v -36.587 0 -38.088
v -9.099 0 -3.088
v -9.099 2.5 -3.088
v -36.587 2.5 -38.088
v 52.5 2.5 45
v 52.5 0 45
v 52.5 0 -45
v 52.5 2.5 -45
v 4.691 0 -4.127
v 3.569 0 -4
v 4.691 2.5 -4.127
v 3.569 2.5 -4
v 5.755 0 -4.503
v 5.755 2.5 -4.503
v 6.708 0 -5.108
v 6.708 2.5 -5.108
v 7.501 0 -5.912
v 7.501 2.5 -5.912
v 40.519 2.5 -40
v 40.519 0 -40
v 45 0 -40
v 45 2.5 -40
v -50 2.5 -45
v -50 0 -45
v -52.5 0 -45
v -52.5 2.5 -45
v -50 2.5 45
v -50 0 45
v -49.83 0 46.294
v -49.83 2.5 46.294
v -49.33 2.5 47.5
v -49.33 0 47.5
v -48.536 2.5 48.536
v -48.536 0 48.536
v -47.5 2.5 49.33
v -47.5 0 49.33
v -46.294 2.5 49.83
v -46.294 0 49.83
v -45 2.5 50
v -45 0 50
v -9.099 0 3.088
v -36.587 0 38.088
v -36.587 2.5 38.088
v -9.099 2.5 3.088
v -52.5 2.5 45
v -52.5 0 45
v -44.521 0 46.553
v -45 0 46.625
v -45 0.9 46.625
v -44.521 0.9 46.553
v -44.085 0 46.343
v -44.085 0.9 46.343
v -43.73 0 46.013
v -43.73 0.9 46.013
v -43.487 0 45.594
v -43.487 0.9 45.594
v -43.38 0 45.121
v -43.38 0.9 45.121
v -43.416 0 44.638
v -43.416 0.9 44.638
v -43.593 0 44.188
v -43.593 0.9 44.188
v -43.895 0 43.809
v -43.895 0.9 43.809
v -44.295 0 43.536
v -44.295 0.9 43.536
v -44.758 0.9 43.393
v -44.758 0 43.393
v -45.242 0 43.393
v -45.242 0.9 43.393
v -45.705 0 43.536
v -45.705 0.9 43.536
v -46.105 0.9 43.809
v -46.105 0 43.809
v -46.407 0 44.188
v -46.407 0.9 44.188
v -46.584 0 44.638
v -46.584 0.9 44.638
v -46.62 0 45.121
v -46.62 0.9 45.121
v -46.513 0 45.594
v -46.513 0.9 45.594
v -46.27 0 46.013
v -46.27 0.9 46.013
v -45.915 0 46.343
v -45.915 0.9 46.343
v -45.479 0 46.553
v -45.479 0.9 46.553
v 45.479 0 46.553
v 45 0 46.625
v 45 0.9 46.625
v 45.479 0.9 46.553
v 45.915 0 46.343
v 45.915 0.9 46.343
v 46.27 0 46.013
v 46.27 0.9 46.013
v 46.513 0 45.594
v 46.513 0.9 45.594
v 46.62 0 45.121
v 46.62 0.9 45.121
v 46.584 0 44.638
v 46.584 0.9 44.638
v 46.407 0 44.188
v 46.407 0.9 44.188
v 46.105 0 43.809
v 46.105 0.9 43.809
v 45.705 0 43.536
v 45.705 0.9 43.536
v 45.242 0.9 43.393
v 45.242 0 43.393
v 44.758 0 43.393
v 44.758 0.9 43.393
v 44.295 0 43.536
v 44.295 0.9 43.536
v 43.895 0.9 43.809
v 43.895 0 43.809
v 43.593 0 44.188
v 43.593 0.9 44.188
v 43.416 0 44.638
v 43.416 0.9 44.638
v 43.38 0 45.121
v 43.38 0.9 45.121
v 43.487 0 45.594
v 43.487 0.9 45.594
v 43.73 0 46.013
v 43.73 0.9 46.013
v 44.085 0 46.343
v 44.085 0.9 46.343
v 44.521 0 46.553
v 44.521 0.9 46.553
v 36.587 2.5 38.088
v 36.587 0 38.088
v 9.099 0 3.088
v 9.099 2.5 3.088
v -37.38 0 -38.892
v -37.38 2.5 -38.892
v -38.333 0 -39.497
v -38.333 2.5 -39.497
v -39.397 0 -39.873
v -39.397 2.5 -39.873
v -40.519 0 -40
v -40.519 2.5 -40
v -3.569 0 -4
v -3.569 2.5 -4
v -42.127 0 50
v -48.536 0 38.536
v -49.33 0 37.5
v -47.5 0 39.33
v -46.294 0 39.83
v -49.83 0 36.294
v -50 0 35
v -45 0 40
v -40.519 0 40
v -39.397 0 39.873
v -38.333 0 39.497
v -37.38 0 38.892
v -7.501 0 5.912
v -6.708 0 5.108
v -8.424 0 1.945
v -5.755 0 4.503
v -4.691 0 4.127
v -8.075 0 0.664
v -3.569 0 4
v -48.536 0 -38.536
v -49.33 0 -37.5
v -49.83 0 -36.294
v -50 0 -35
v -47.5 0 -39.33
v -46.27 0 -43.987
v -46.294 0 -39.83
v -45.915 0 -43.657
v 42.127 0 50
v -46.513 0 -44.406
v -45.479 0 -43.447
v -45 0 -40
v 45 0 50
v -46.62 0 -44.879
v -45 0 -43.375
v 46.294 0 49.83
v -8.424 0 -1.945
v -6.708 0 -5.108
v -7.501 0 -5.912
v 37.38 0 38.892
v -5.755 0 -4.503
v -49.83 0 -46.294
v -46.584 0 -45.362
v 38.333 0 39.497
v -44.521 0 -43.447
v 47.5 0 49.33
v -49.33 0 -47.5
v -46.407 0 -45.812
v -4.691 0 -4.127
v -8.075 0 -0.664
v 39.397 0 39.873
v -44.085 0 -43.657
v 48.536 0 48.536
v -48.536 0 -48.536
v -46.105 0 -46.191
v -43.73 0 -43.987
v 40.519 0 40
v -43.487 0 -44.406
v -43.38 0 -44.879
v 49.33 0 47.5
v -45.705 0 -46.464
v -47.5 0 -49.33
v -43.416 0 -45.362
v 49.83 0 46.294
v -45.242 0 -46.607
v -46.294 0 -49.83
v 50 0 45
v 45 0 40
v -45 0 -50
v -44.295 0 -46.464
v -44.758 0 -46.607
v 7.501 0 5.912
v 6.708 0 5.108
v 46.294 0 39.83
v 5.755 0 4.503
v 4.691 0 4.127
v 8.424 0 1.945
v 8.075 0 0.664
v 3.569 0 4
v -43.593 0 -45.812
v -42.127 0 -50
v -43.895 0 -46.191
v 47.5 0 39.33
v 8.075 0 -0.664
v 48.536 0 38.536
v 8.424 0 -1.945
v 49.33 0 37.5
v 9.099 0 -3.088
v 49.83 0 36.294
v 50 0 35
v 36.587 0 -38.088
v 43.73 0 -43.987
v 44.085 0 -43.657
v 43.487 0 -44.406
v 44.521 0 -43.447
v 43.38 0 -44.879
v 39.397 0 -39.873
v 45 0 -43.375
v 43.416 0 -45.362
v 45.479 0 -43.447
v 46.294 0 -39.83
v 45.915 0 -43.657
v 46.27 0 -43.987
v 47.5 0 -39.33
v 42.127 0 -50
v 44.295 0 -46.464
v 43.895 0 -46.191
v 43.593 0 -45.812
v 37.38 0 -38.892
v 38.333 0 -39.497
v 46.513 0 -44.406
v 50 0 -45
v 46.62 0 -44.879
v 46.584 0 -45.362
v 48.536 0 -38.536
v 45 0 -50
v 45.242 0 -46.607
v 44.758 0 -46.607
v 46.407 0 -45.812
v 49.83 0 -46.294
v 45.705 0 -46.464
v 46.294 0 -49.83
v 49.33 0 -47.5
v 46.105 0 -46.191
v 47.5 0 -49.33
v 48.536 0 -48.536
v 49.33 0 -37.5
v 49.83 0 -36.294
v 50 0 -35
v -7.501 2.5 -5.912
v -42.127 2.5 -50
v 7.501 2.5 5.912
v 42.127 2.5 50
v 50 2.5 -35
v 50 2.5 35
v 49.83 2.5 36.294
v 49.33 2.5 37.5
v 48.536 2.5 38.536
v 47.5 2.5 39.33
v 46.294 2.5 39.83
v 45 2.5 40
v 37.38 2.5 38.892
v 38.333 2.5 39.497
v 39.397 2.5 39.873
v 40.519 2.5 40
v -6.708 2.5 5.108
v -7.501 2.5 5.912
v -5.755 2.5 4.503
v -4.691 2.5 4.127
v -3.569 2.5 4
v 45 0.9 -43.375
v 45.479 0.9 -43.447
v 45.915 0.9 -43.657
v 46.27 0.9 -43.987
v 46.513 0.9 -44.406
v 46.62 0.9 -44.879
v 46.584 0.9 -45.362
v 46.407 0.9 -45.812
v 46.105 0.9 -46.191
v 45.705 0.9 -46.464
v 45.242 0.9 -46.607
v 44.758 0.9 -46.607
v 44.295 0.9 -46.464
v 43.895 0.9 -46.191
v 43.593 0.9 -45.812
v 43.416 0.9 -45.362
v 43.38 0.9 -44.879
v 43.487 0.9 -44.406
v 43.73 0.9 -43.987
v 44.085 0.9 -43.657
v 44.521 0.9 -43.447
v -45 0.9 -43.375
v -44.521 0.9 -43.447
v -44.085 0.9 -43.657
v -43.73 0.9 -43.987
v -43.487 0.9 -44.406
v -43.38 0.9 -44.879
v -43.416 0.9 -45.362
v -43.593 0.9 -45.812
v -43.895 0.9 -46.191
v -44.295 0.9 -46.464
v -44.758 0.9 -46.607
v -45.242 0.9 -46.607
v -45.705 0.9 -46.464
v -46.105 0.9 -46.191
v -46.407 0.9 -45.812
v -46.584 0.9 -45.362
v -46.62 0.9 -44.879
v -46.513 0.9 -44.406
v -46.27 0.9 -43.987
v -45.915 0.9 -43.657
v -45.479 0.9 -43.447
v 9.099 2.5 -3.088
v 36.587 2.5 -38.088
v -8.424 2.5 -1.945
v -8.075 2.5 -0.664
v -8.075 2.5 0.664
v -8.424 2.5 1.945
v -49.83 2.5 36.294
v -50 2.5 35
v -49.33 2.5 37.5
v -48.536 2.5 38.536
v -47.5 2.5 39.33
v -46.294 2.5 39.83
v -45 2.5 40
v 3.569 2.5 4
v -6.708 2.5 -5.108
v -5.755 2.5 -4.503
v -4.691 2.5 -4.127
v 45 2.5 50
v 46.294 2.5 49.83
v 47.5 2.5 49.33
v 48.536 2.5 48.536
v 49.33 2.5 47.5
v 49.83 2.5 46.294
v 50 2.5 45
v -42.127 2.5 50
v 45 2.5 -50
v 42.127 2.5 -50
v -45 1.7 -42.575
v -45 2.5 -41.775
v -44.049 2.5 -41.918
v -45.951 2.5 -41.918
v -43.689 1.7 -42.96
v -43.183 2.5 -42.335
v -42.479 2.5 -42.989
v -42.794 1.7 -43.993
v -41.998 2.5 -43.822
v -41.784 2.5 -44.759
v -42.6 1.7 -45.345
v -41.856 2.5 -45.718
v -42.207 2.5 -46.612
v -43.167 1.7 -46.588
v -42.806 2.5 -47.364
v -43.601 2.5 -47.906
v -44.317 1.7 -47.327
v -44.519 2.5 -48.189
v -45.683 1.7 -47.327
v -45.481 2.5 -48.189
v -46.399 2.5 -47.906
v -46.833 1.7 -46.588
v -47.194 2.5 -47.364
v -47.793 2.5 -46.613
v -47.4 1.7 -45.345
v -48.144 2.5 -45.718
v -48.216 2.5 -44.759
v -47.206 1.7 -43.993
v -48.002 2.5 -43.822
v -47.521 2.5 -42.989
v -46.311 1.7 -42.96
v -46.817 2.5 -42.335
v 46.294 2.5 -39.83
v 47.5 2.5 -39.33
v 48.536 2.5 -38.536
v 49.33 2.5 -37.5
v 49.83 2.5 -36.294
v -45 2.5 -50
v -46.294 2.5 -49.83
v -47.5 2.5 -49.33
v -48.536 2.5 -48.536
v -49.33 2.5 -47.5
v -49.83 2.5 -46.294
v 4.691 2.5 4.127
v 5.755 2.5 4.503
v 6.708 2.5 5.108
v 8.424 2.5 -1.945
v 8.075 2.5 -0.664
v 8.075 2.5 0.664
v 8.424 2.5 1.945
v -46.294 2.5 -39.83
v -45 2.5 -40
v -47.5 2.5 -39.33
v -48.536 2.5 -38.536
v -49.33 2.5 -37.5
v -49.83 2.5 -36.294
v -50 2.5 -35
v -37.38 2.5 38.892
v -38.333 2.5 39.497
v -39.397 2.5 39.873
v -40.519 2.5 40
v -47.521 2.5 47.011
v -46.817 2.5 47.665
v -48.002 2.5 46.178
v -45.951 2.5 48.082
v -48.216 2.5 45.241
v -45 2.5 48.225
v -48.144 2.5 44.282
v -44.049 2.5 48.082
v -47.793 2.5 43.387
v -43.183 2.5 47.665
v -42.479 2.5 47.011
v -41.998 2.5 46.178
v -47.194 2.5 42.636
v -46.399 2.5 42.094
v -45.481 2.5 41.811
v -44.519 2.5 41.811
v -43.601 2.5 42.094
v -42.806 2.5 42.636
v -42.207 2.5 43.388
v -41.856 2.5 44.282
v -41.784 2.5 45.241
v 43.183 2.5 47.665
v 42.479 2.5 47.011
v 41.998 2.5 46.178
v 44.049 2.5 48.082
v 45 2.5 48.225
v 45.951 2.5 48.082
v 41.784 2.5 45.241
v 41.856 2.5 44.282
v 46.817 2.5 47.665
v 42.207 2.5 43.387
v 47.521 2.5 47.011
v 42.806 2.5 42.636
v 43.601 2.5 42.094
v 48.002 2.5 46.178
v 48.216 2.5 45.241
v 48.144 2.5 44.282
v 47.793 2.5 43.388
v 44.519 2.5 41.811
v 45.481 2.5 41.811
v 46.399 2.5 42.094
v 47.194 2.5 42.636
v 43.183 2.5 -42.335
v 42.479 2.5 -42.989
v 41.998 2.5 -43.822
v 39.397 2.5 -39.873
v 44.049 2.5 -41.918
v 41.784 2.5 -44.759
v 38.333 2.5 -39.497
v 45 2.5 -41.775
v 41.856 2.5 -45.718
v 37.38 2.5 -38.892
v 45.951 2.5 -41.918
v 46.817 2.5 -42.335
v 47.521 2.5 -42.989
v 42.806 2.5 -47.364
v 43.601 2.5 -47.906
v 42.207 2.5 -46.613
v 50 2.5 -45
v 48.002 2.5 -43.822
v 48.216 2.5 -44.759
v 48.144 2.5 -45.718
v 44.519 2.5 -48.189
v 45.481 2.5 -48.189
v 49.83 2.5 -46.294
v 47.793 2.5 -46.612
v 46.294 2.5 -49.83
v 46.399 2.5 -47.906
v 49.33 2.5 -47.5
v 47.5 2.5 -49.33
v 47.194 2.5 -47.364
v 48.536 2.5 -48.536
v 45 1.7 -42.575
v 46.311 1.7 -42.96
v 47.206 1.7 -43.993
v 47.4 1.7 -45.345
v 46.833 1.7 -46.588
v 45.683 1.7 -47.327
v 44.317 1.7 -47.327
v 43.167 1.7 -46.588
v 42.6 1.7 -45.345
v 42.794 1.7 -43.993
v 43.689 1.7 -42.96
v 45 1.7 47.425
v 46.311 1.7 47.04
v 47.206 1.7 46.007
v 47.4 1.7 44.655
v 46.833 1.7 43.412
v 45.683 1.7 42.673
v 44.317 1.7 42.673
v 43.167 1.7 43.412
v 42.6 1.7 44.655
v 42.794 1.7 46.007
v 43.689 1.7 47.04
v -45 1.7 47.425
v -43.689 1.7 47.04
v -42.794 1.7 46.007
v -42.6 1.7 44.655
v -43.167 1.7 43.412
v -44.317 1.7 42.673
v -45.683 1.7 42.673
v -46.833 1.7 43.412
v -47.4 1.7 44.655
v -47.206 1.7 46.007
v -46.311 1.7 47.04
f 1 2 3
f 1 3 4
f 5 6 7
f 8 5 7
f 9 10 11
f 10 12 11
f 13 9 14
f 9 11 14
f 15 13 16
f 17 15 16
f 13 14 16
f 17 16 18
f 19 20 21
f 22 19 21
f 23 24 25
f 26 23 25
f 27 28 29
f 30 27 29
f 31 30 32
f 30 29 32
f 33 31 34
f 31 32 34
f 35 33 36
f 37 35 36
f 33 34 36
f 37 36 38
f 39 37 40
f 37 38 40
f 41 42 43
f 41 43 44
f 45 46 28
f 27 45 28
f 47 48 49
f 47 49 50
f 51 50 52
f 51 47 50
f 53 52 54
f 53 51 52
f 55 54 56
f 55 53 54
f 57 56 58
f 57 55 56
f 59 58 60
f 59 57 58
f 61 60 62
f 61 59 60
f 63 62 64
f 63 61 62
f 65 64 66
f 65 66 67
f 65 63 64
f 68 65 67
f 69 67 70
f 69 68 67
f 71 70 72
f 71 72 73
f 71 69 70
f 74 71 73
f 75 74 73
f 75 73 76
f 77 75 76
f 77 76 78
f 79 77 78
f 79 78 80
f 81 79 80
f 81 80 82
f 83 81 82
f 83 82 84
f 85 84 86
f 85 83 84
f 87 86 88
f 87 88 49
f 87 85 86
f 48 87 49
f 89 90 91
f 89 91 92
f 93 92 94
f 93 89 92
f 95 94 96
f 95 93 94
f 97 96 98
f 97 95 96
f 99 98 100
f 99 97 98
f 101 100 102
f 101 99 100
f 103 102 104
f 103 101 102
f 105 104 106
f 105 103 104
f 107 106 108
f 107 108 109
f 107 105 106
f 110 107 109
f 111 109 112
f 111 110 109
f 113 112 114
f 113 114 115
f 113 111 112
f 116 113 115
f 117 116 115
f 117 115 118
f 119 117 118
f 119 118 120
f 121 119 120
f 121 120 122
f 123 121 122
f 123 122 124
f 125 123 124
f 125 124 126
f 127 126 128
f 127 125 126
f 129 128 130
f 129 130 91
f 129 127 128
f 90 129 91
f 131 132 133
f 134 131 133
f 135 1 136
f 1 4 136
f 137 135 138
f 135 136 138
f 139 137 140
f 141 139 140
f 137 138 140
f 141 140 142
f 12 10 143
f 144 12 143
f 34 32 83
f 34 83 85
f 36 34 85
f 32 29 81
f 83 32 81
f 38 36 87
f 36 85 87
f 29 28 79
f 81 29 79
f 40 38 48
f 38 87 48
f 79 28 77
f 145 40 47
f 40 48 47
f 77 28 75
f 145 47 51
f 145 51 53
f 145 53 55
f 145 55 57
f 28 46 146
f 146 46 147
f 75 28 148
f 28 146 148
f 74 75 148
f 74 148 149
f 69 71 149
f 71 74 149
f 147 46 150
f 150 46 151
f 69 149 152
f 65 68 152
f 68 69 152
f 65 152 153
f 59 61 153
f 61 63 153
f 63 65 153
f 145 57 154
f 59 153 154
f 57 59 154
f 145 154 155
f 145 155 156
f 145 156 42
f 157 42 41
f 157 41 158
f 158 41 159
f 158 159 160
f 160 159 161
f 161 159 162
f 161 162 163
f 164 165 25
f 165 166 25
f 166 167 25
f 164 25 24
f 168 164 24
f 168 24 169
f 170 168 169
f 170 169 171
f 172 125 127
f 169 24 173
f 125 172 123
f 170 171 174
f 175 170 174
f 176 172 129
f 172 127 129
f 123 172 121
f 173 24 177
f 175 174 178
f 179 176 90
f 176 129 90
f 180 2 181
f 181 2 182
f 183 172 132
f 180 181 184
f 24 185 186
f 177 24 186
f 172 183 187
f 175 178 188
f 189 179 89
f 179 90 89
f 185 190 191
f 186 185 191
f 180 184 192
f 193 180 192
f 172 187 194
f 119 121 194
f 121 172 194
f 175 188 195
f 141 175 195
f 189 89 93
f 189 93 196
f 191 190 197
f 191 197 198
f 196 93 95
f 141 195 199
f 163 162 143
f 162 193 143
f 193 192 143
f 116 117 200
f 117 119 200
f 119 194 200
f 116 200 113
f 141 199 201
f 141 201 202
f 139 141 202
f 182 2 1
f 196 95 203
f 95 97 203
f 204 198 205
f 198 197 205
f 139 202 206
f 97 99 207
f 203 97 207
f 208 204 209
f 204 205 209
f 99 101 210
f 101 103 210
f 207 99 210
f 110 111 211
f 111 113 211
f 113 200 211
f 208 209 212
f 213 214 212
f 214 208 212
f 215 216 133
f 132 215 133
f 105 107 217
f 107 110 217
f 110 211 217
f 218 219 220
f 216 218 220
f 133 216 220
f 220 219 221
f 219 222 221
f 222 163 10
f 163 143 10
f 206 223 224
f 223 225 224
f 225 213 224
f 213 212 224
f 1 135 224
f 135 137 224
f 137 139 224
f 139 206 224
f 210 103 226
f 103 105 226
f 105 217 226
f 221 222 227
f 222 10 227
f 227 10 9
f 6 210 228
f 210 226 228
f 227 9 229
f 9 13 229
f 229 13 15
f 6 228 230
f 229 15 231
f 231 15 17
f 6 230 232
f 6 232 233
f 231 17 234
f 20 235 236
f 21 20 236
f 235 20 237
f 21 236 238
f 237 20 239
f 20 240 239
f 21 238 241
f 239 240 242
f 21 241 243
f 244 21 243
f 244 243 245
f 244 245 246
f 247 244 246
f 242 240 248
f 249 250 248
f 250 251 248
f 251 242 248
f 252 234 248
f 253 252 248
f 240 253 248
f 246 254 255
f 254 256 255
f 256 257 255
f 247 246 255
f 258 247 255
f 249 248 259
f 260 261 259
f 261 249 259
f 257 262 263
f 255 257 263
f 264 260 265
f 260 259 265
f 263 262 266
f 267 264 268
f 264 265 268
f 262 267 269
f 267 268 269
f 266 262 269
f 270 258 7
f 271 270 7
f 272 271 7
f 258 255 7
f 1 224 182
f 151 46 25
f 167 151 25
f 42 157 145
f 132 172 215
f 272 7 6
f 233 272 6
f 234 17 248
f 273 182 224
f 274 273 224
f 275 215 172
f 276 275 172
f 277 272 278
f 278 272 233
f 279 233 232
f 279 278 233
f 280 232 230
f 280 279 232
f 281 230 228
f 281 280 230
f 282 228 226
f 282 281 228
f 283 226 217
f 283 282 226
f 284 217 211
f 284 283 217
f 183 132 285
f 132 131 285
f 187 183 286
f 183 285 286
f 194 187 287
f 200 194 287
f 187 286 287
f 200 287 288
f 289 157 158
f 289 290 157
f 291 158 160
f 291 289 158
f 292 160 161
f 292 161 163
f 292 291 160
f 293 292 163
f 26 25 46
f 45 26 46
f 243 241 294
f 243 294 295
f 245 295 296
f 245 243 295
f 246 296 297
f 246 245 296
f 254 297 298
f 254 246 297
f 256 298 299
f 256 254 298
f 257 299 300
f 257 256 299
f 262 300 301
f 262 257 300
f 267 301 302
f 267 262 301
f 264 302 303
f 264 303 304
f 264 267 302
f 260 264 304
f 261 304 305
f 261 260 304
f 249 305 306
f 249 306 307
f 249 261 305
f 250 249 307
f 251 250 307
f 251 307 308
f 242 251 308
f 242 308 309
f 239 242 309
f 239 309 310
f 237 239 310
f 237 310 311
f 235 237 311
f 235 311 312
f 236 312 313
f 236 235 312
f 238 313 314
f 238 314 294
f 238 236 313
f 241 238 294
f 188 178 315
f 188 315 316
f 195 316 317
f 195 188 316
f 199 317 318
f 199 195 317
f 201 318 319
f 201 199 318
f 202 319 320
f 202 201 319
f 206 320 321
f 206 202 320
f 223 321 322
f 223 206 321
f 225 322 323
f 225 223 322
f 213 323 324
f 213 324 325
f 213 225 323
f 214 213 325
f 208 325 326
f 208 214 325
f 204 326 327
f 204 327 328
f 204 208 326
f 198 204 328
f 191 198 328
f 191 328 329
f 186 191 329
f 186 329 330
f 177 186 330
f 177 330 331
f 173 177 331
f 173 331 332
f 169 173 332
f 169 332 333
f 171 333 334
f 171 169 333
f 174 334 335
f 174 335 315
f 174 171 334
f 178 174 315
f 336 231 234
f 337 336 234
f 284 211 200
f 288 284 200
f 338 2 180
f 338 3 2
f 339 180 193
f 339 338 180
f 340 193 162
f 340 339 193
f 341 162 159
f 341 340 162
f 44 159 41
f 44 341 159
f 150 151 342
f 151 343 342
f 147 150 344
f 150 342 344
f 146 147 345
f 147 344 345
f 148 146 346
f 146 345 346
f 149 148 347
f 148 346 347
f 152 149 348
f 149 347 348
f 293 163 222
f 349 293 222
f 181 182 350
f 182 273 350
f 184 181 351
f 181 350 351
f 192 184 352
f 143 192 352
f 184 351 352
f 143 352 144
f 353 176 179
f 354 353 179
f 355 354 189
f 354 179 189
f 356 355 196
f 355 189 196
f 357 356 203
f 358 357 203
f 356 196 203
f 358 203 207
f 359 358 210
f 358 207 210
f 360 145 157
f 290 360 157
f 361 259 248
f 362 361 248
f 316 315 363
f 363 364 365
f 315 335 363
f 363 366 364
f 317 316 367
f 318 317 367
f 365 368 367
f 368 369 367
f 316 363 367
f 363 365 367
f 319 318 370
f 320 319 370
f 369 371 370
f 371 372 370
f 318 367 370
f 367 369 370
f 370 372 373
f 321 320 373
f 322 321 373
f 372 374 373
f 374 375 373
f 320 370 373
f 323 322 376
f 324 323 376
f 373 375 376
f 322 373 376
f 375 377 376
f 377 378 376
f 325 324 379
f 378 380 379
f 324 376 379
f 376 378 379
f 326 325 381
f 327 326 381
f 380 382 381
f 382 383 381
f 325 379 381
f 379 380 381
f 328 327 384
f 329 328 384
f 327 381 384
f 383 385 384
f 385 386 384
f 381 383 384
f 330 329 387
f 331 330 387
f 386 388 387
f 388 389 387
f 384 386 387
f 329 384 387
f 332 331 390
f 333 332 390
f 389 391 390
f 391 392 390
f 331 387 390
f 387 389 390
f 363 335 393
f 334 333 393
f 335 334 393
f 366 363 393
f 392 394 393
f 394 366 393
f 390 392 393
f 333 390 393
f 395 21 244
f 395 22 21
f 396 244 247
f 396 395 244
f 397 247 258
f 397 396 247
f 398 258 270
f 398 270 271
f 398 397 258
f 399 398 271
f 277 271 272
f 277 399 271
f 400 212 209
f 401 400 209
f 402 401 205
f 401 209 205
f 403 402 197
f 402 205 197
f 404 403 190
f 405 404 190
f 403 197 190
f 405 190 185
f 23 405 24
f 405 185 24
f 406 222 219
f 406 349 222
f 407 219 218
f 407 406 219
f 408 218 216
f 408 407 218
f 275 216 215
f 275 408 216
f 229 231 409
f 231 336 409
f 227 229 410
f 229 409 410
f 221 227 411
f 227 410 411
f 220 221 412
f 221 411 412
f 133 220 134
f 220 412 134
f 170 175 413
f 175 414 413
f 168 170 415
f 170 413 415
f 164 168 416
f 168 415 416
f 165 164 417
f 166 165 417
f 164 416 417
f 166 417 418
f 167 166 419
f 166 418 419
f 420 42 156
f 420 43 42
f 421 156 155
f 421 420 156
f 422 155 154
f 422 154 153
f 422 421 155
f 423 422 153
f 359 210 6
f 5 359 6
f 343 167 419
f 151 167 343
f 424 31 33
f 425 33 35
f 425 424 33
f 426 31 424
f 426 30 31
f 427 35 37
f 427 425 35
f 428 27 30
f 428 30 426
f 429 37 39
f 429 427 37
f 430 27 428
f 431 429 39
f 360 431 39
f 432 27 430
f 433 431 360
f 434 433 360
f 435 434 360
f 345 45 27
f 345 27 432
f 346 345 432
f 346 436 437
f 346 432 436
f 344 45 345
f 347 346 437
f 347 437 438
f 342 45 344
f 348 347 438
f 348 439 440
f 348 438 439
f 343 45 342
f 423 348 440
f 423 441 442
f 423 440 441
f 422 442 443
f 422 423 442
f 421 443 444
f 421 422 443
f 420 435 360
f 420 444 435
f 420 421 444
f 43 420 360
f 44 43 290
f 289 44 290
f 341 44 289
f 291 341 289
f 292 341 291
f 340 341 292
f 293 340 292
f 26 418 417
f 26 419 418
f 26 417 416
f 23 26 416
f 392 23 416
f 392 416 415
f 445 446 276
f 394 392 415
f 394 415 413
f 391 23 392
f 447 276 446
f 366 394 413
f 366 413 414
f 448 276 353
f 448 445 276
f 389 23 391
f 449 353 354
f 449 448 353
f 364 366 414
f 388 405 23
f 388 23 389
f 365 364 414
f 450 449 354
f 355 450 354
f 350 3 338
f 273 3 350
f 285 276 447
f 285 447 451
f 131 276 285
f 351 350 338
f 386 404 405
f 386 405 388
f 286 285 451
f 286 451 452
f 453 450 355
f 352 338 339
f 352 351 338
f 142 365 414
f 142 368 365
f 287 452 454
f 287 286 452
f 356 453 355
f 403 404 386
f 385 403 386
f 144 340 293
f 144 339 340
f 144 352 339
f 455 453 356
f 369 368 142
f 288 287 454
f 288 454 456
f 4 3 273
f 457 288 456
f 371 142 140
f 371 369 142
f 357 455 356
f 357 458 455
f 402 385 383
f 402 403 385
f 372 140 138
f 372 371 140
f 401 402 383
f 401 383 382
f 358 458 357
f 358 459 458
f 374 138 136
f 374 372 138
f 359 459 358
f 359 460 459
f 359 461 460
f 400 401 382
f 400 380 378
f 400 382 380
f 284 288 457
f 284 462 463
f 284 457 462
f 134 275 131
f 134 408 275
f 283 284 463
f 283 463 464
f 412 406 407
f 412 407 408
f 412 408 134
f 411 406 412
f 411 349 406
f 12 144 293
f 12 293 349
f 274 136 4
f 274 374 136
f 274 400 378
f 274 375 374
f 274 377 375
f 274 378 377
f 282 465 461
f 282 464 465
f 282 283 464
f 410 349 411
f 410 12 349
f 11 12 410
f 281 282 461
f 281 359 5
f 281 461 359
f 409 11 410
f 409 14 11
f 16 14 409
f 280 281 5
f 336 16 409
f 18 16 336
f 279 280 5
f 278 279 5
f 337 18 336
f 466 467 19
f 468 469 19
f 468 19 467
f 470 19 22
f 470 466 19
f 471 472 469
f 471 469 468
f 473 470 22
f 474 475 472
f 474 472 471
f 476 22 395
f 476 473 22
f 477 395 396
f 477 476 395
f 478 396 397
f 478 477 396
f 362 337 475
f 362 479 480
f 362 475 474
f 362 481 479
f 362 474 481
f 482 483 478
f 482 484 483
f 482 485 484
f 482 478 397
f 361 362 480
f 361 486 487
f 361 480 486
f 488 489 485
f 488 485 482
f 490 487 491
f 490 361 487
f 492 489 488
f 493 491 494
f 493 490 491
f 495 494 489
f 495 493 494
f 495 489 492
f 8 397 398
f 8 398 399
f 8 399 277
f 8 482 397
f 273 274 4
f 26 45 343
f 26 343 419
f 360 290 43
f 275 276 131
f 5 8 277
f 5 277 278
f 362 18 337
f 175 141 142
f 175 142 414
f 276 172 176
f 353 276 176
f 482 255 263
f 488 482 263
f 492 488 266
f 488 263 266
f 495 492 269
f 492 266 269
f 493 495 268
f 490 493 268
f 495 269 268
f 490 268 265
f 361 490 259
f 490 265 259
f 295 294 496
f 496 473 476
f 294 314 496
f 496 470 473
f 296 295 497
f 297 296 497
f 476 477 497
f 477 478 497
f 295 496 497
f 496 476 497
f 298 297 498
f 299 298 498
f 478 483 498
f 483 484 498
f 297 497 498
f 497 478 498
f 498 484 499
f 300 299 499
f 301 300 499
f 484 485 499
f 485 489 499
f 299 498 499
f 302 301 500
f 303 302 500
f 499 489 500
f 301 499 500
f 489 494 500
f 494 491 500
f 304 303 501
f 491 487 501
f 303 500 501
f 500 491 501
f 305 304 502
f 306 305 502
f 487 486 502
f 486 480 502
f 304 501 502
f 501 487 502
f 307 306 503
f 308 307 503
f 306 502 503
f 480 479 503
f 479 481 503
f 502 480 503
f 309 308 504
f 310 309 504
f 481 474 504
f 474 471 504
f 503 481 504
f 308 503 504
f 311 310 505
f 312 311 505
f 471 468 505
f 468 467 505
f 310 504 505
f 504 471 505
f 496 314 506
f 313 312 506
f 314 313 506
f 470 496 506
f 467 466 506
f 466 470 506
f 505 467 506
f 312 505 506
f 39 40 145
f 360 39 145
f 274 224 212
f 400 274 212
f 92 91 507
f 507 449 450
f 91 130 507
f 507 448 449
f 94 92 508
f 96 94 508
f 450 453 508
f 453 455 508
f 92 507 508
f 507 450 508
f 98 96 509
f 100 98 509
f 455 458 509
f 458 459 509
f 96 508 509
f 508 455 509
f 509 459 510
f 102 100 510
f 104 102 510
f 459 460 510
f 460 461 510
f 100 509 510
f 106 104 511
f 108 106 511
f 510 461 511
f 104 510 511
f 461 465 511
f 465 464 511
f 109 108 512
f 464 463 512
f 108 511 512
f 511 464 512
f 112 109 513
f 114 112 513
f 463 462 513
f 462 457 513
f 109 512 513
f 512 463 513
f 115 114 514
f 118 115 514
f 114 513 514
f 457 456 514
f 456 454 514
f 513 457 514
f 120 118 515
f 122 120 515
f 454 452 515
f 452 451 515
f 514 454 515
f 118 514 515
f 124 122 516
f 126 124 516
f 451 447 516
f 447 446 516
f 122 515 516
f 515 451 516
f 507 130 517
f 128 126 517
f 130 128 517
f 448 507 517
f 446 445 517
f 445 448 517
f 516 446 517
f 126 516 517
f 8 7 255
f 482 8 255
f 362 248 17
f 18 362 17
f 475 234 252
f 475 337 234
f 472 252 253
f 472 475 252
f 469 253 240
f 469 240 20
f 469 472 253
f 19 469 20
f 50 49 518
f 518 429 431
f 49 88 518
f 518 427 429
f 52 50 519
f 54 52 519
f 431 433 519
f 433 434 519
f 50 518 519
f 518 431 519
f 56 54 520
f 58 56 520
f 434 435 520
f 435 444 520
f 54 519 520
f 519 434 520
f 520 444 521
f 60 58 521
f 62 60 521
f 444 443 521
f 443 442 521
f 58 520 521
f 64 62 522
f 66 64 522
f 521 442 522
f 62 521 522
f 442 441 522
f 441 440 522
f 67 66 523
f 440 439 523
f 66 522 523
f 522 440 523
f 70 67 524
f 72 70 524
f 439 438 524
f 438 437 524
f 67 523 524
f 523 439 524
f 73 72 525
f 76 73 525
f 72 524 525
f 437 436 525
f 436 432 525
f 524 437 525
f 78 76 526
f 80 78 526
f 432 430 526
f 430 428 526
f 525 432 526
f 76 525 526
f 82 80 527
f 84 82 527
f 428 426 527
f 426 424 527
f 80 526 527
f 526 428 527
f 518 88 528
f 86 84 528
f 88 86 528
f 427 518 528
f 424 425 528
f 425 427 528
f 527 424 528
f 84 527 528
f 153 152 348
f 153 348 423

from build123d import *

# Parameters (mm, degrees)
SKETCH1_R           = 1.625
BOSS_EXTRUDE1_DEPTH = 2.5
FILLET1_R           = 5
FILLET2_R           = 5
CHAMFER1_SIZE       = 1.6


with BuildPart() as part:
    # Sketch1 → Boss-Extrude1 (new body)
    with BuildSketch(Plane(origin=(0, 0, 0), x_dir=(1, 0, 0), z_dir=(0, 1, 0))):
        with BuildLine():
            Line((-52.5, 45), (-52.5, -45))
            Line((-52.5, -45), (-50, -45))
            ThreePointArc((-50, -45), (-48.535533906, -48.535533906), (-45, -50))
            Line((-45, -50), (-42.127158908, -50))
            Line((-42.127158908, -50), (-6, -4))
            Line((-6, -4), (6, -4))
            Line((6, -4), (42.127158908, -50))
            Line((42.127158908, -50), (45, -50))
            ThreePointArc((45, -50), (48.535533906, -48.535533906), (50, -45))
            Line((50, -45), (52.5, -45))
            Line((52.5, -45), (52.5, 45))
            Line((52.5, 45), (50, 45))
            ThreePointArc((50, 45), (48.535533906, 48.535533906), (45, 50))
            Line((45, 50), (42.127158908, 50))
            Line((42.127158908, 50), (6, 4))
            Line((6, 4), (-6, 4))
            Line((-6, 4), (-42.127158908, 50))
            Line((-42.127158908, 50), (-45, 50))
            ThreePointArc((-45, 50), (-48.535533906, 48.535533906), (-50, 45))
            Line((-50, 45), (-52.5, 45))
        make_face()
        with Locations(Location((-45, 45, 0), (0, 0, 270))):
            Circle(SKETCH1_R, mode=Mode.SUBTRACT)
        with Locations(Location((45, 45, 0), (0, 0, 270))):
            Circle(SKETCH1_R, mode=Mode.SUBTRACT)
        with Locations(Location((-45, -45, 0), (0, 0, 270))):
            Circle(SKETCH1_R, mode=Mode.SUBTRACT)
        with Locations(Location((45, -45, 0), (0, 0, 270))):
            Circle(SKETCH1_R, mode=Mode.SUBTRACT)
        Polygon((-50, 40), (-50, -40), (-38.088044946, -40), (-6.673124156, 0), (-38.088044946, 40), align=None, mode=Mode.SUBTRACT)
        Polygon((50, -40), (38.088044946, -40), (6.673124156, 0), (38.088044946, 40), (50, 40), align=None, mode=Mode.SUBTRACT)
    extrude(amount=BOSS_EXTRUDE1_DEPTH)

    # Fillet1
    fillet1_edges = [part.edges().sort_by_distance(p)[0] for p in [
        (-6, 1.25, -4),
        (6, 1.25, -4),
        (6, 1.25, 4),
        (-6, 1.25, 4),
        (-6.673124156, 1.25, 0),
        (6.673124156, 1.25, 0),
    ]]
    fillet(fillet1_edges, radius=FILLET1_R)

    # Fillet2
    fillet2_edges = [part.edges().sort_by_distance(p)[0] for p in [
        (-38.088044946, 1.25, -40),
        (-50, 1.25, -40),
        (-50, 1.25, 40),
        (-38.088044946, 1.25, 40),
        (50, 1.25, 40),
        (50, 1.25, -40),
        (38.088044946, 1.25, -40),
        (38.088044946, 1.25, 40),
    ]]
    fillet(fillet2_edges, radius=FILLET2_R)

    # Chamfer1
    chamfer1_edges = [part.edges().sort_by_distance(p)[0] for p in [
        (-45, 2.5, -46.625),
        (45, 2.5, -46.625),
        (-45, 2.5, 43.375),
        (45, 2.5, 43.375),
    ]]
    chamfer(chamfer1_edges, length=CHAMFER1_SIZE)


solid = part.part
